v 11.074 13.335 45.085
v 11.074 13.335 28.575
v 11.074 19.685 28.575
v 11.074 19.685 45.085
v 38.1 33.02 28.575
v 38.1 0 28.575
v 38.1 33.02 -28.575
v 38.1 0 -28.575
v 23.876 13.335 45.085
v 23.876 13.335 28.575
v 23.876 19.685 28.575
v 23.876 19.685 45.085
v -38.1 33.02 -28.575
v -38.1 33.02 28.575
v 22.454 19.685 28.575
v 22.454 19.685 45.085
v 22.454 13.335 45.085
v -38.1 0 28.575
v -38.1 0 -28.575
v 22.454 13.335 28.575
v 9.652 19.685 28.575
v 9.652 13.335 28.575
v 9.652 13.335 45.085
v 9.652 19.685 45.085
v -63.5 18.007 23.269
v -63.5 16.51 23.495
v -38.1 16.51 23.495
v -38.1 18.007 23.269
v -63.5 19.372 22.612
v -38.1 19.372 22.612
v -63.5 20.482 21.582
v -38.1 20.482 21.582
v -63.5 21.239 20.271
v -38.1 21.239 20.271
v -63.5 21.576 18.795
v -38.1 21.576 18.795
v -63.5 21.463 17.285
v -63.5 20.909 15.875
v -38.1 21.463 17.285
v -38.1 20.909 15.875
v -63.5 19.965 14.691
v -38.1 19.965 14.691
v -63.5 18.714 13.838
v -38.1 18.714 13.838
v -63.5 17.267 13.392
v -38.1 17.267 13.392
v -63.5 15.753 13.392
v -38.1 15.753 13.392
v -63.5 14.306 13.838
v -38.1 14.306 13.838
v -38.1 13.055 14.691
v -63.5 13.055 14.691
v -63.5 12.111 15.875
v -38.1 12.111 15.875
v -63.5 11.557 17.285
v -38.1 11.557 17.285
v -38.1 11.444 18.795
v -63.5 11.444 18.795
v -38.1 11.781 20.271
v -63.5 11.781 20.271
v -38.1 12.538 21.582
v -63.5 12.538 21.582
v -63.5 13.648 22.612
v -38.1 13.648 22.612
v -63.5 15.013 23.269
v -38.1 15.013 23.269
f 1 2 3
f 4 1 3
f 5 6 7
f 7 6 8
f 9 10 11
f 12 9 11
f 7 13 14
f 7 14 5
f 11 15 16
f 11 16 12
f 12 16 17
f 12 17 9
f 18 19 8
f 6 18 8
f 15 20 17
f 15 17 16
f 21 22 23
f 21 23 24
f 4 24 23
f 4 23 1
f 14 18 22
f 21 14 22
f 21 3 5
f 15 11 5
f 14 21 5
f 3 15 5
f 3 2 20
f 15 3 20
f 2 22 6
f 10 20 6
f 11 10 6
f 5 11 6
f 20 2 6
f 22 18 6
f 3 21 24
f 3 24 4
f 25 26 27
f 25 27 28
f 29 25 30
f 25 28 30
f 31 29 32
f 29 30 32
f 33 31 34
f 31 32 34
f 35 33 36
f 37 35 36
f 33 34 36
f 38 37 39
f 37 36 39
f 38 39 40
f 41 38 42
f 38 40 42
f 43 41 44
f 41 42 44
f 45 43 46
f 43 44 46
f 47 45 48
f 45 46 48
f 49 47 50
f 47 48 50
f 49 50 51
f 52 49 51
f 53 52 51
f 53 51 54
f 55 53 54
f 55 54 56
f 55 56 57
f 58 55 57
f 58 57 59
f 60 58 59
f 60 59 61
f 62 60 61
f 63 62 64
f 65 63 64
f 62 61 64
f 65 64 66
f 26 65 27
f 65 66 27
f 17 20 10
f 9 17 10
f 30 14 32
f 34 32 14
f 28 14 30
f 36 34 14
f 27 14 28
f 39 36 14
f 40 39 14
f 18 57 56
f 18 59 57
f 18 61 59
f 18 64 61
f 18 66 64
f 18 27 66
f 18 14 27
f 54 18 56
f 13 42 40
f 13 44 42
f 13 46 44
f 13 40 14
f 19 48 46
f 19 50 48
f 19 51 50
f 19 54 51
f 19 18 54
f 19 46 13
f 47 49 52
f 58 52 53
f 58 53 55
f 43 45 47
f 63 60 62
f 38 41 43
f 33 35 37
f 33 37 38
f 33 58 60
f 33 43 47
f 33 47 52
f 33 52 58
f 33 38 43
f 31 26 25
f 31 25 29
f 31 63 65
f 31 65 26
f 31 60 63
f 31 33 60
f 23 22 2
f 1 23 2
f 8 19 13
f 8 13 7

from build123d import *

# Parameters (mm, degrees)
SKETCH1_W           = 76.2
SKETCH1_H           = 57.15
BOSS_EXTRUDE1_DEPTH = 33.02
SKETCH2_R           = 5.08
BOSS_EXTRUDE2_DEPTH = 25.4
SKETCH3_W           = 1.4224
SKETCH3_H           = 6.35
BOSS_EXTRUDE3_DEPTH = 16.51


with BuildPart() as part:
    # Sketch1 → Boss-Extrude1 (new body)
    with BuildSketch(Plane(origin=(0, 0, 0), x_dir=(1, 0, 0), z_dir=(0, 1, 0))):
        Rectangle(SKETCH1_W, SKETCH1_H)
    extrude(amount=BOSS_EXTRUDE1_DEPTH)

    # Sketch2 → Boss-Extrude2 (add)
    with BuildSketch(Plane.ZY.offset(38.1)):
        with Locations((18.415, 16.51)):
            Circle(SKETCH2_R)
    extrude(amount=BOSS_EXTRUDE2_DEPTH)

    # Sketch3 → Boss-Extrude3 (add)
    with BuildSketch(Plane.XY.offset(28.575)):
        with Locations((23.1648, 16.51)):
            Rectangle(SKETCH3_W, SKETCH3_H)
        with Locations((10.3632, 16.51)):
            Rectangle(SKETCH3_W, SKETCH3_H)
    extrude(amount=BOSS_EXTRUDE3_DEPTH)


solid = part.part
